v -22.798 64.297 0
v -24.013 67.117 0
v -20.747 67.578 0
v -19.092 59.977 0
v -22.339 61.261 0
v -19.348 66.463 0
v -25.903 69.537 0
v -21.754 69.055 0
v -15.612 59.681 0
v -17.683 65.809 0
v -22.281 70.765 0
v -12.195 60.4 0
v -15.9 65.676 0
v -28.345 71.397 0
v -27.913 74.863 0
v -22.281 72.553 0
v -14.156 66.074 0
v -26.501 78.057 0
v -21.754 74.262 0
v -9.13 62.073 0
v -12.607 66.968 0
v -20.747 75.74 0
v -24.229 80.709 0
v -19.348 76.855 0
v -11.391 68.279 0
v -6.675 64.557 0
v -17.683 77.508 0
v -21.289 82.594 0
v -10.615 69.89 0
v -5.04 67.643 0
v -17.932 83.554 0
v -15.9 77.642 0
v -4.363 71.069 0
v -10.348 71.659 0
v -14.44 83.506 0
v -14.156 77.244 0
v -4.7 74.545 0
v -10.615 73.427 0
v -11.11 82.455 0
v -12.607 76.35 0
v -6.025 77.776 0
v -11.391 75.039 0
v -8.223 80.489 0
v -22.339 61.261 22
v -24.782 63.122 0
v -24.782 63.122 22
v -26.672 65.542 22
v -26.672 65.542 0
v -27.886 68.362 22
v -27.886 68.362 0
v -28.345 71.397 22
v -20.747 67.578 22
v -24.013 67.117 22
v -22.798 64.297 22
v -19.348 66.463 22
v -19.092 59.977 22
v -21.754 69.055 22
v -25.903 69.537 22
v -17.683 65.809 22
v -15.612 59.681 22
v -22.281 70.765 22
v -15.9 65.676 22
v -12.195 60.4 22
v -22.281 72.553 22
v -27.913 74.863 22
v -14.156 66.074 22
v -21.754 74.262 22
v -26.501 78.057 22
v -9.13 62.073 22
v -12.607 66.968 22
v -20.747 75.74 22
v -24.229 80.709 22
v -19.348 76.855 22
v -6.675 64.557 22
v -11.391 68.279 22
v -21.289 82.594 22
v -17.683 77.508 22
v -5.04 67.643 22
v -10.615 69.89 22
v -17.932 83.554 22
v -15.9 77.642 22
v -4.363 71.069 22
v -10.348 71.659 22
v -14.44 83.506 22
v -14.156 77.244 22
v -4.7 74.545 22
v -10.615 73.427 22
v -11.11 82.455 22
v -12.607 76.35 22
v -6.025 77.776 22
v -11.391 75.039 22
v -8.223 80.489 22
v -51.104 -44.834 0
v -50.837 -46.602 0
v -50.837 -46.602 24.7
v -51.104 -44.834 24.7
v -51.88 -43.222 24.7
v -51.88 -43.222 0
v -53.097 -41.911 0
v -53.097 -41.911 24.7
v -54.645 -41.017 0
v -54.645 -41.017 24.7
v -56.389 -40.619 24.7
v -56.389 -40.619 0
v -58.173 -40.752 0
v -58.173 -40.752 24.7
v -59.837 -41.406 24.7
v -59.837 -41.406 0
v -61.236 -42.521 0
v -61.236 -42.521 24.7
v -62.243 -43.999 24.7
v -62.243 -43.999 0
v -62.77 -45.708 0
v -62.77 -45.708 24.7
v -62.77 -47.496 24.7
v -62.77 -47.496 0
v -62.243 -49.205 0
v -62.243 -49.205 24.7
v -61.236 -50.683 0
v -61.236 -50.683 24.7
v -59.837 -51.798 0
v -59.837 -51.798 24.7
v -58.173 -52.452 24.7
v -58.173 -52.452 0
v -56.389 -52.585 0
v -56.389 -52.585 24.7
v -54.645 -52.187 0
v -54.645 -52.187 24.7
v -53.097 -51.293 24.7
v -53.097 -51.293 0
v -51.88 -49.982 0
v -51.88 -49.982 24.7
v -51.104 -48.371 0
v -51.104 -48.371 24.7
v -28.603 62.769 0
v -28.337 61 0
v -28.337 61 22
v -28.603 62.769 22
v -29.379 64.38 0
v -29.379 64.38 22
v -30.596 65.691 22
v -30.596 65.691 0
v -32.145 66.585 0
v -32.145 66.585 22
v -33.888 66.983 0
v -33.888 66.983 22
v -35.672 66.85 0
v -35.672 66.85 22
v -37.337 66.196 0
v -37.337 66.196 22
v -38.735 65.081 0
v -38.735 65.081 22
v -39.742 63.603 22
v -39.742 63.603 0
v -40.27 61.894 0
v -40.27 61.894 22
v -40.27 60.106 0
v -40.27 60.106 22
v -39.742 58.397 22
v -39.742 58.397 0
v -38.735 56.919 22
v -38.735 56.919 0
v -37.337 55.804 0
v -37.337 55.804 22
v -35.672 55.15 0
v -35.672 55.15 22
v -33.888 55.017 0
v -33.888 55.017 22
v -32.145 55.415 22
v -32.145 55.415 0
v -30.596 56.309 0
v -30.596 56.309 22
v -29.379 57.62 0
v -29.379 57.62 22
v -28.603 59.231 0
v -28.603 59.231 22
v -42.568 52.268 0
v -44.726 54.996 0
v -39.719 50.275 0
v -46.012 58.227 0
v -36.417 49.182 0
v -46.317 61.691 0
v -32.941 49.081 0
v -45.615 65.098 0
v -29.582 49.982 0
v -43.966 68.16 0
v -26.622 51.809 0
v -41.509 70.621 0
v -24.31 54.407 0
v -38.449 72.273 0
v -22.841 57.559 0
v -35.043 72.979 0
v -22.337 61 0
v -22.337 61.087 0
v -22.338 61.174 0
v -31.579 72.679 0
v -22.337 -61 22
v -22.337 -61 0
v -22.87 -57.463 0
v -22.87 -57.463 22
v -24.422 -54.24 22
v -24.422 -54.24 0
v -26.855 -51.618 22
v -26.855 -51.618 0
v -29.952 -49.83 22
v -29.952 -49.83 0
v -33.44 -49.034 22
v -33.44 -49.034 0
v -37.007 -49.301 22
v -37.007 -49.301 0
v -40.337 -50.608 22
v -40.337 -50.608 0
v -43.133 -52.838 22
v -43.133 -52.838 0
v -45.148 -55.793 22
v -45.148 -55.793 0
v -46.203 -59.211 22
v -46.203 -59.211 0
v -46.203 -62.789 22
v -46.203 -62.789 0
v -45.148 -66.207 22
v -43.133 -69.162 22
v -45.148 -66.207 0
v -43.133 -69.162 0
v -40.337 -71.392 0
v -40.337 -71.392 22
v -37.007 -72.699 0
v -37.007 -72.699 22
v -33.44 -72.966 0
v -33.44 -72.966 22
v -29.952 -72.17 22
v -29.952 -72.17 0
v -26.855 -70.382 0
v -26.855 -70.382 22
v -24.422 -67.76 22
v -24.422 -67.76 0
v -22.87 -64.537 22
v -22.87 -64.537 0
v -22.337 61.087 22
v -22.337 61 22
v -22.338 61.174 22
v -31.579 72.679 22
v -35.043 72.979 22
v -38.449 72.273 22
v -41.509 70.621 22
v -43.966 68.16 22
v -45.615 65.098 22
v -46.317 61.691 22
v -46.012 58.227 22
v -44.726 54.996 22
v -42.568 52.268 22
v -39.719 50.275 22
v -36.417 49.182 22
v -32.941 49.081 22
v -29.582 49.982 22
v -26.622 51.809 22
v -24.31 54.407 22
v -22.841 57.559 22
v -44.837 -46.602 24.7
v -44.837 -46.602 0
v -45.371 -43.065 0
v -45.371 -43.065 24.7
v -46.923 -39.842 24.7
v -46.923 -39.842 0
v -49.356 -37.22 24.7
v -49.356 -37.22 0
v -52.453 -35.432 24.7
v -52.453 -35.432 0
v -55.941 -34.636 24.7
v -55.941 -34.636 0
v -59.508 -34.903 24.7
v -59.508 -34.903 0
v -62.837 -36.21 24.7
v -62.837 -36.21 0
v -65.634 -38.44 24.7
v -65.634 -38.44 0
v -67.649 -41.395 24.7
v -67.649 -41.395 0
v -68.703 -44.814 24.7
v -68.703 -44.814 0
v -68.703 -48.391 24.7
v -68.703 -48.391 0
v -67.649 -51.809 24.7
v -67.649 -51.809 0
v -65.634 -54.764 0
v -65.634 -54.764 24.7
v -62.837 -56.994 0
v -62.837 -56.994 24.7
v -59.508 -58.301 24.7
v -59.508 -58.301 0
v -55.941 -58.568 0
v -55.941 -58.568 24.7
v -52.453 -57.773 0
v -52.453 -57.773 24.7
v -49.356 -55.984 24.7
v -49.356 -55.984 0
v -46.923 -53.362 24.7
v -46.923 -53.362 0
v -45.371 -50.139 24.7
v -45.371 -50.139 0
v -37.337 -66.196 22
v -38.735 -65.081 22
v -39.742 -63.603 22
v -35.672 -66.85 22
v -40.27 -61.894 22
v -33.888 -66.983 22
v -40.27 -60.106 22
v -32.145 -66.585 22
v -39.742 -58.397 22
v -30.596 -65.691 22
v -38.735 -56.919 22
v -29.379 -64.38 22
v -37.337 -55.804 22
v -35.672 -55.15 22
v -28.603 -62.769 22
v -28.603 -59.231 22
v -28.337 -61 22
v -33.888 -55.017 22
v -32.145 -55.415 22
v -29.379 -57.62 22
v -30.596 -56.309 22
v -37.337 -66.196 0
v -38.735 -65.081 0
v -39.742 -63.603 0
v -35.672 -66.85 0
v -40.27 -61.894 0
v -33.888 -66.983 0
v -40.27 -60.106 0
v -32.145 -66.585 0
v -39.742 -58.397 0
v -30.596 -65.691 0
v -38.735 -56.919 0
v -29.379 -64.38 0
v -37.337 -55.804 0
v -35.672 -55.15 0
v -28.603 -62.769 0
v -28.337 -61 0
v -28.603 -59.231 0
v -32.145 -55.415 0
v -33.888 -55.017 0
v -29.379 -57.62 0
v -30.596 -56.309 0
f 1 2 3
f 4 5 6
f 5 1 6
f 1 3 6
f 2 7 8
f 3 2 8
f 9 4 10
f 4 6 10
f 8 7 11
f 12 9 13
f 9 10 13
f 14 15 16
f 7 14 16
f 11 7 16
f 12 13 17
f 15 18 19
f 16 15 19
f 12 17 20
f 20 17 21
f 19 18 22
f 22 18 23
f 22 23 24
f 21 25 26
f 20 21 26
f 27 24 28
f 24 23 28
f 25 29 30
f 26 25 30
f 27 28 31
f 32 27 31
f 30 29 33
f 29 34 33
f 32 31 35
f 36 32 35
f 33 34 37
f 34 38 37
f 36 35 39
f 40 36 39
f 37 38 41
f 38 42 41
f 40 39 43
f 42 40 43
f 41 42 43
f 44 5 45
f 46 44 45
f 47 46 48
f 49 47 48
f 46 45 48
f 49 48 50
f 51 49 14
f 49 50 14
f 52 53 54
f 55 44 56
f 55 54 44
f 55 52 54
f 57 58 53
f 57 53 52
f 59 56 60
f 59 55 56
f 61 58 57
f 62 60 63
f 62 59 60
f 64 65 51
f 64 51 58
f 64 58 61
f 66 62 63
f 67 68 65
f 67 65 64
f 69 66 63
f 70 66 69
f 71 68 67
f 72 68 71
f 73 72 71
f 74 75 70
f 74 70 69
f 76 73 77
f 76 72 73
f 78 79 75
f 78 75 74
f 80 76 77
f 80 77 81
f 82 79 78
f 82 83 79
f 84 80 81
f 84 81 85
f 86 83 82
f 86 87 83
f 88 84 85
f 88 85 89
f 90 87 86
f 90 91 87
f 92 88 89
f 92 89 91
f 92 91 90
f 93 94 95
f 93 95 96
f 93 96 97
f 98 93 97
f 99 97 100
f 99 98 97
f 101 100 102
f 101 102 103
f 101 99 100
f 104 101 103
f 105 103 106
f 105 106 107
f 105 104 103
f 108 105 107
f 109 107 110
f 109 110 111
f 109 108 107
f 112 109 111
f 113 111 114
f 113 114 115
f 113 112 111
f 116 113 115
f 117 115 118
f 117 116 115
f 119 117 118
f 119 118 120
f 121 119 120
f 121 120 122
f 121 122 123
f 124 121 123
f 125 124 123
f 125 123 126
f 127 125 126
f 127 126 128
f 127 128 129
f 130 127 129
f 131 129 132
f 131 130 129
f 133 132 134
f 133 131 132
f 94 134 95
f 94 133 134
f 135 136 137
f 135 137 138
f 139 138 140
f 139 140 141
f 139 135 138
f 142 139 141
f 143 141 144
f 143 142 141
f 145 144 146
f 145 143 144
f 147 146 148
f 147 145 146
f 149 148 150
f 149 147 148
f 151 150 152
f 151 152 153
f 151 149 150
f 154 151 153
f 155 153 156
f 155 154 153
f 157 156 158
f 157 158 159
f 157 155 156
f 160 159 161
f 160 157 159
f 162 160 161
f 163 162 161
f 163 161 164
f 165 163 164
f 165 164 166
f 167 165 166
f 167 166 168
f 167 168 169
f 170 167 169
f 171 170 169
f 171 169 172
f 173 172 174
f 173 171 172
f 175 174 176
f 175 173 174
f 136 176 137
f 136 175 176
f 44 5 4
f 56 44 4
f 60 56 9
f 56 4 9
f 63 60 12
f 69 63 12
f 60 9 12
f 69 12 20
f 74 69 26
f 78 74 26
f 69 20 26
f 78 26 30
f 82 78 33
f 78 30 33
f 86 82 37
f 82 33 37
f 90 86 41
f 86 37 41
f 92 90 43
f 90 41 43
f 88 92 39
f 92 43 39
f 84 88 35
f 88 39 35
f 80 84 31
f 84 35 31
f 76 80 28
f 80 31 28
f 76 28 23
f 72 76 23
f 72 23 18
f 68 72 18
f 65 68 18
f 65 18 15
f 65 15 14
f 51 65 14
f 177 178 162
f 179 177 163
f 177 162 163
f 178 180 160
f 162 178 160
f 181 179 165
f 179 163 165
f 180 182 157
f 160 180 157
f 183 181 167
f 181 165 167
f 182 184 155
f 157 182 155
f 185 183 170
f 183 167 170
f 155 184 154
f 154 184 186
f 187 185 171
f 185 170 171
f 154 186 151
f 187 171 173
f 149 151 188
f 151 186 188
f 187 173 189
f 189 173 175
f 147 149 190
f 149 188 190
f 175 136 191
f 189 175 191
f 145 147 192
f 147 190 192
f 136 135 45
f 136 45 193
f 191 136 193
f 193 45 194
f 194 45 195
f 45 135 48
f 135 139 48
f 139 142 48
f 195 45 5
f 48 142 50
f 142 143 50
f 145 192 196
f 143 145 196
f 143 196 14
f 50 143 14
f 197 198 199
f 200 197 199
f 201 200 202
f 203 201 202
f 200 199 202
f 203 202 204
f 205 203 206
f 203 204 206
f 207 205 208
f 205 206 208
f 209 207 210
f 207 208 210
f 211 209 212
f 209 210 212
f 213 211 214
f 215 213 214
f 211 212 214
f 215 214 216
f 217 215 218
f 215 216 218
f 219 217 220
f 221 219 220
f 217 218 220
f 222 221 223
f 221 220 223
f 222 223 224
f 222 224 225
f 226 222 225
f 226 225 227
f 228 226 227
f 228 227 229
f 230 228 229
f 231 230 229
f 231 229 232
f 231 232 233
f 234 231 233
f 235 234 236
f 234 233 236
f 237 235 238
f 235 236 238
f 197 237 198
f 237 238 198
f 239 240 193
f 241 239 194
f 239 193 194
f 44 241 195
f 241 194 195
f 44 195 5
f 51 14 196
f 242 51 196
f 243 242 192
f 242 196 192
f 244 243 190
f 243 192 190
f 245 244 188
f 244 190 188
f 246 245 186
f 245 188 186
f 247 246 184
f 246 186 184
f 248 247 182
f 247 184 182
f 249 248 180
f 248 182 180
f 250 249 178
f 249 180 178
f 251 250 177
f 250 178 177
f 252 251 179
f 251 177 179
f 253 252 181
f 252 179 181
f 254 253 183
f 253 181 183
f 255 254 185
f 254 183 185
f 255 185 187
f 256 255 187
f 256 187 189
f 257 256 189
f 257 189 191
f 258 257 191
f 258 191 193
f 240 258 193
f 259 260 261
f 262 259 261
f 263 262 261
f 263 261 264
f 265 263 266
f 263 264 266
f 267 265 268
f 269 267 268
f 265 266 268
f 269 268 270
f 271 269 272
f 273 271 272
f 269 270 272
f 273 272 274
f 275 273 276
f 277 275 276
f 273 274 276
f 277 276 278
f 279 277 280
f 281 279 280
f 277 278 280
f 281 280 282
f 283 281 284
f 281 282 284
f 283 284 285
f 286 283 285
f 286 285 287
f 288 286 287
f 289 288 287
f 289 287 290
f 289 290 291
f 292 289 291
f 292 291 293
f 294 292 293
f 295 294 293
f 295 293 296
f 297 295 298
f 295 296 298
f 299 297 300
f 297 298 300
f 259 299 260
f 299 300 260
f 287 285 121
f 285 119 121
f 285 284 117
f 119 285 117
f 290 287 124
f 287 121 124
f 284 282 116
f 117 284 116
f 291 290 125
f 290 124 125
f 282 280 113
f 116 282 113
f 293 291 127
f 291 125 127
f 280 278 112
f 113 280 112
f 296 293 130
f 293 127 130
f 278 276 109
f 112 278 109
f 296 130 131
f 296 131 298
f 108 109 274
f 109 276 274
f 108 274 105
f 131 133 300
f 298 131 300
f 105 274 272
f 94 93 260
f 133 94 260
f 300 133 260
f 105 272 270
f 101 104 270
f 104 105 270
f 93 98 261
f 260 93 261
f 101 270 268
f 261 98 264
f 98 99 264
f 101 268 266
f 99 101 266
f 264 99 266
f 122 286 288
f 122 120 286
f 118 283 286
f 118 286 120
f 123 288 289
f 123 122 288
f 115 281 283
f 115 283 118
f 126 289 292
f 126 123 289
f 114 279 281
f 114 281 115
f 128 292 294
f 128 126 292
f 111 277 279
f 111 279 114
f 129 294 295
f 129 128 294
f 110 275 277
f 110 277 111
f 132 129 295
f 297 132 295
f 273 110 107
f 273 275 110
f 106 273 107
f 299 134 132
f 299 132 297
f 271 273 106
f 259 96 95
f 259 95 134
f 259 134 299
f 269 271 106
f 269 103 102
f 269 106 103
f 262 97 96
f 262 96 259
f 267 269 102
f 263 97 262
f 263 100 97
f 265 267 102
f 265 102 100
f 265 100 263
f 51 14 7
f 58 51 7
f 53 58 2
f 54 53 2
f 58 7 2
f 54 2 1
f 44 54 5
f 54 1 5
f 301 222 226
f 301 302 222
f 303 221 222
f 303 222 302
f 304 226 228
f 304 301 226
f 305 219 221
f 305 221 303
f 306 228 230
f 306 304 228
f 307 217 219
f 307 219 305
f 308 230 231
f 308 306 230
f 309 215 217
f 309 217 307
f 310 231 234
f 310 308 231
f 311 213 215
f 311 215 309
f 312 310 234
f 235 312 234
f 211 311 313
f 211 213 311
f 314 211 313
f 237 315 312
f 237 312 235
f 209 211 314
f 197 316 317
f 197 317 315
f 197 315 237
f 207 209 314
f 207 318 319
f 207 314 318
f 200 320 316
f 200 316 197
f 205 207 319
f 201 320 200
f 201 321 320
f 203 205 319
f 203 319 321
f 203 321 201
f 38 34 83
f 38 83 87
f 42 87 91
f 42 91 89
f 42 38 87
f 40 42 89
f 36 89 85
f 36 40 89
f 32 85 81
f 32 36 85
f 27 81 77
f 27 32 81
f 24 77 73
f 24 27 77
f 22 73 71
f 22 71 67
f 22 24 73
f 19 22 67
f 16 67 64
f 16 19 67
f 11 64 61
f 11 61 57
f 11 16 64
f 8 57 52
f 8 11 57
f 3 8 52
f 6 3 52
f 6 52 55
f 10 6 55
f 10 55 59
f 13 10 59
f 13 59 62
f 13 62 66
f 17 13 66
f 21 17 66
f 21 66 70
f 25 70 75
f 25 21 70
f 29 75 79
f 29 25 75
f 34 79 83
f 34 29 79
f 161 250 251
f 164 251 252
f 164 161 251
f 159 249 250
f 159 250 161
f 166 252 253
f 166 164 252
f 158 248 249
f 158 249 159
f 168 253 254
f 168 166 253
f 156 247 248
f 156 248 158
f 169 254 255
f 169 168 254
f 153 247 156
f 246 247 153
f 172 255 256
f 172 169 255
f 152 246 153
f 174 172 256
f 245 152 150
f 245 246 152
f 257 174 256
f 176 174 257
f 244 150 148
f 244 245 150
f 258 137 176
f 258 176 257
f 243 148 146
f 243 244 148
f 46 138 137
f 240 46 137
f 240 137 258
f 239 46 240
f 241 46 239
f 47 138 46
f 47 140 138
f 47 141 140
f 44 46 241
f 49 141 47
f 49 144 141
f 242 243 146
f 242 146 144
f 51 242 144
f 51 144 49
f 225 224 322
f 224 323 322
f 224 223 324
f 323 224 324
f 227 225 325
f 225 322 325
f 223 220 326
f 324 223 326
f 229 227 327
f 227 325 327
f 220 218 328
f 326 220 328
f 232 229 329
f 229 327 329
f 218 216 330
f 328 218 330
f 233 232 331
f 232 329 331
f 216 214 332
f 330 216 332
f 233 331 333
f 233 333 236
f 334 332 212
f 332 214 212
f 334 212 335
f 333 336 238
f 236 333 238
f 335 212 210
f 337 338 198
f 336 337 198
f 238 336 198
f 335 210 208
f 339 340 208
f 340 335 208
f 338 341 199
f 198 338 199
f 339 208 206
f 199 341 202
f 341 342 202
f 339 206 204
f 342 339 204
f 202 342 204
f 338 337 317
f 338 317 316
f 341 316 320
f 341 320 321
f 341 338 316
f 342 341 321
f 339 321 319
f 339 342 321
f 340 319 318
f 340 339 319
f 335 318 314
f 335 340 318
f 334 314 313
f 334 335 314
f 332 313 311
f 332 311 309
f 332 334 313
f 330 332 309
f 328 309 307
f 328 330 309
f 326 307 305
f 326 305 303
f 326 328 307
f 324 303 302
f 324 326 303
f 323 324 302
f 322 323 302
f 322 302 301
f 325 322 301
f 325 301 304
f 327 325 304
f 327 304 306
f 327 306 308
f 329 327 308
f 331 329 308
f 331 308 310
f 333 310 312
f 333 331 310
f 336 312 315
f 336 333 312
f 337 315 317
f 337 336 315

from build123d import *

# Parameters (mm, degrees)
F0_R     = 6
F1_DEPTH = 22
F0_R_2   = 12
F2_DEPTH = 24.7


# Not quite as in the source:
# - a feature names something its author has since deleted; it is built from what else it names


with BuildPart() as f1:
    # F0 (on Top) → F1 (new body)
    with BuildSketch(Plane.XY):
        with BuildLine():
            ThreePointArc((-22.3394160141, 61.2613618045), (-26.6720359479, 65.5415552979), (-28.3454602985, 71.3974329242))
            ThreePointArc((-28.3454602985, 71.3974329242), (-44.7263073816, 54.9955562097), (-22.3365694268, 61))
            ThreePointArc((-22.3365694268, 61), (-22.3372810947, 61.1306886528), (-22.3394160141, 61.2613618045))
        make_face()
        with Locations((-34.3365694268, 61)):
            Circle(F0_R, mode=Mode.SUBTRACT)
    extrude(amount=F1_DEPTH)


with BuildPart() as f1b:
    # F0 (on Top) → F1, piece 2 (new body)
    with BuildSketch(Plane.XY):
        with Locations((-34.3365694268, -61)):
            Circle(F0_R_2)
        with Locations((-34.3365694268, -61)):
            Circle(F0_R, mode=Mode.SUBTRACT)
    extrude(amount=F1_DEPTH)


with BuildPart() as f1c:
    # F0 (on Top) → F1, piece 3 (new body)
    with BuildSketch(Plane.XY):
        with BuildLine():
            ThreePointArc((-22.3394160141, 61.2613618045), (-10.3438630956, 61.2690567739), (-4.3483068859, 71.6587947287))
            ThreePointArc((-4.3483068859, 71.6587947287), (-16.4789955387, 83.6580830607), (-28.3454602985, 71.3974329242))
            ThreePointArc((-28.3454602985, 71.3974329242), (-24.0128403647, 67.1172394308), (-22.3394160141, 61.2613618045))
        make_face()
        with Locations((-16.3483068859, 71.6587947287)):
            Circle(F0_R, mode=Mode.SUBTRACT)
    extrude(amount=F1_DEPTH)


with BuildPart() as f2:
    # F0 (on Top) → F2 (new body)
    with BuildSketch(Plane.XY):
        with Locations((-56.8374801716, -46.6020476776)):
            Circle(F0_R_2)
        with Locations((-56.8374801716, -46.6020476776)):
            Circle(F0_R, mode=Mode.SUBTRACT)
    extrude(amount=F2_DEPTH)


solid = Compound([f1.part, f1b.part, f1c.part, f2.part])
